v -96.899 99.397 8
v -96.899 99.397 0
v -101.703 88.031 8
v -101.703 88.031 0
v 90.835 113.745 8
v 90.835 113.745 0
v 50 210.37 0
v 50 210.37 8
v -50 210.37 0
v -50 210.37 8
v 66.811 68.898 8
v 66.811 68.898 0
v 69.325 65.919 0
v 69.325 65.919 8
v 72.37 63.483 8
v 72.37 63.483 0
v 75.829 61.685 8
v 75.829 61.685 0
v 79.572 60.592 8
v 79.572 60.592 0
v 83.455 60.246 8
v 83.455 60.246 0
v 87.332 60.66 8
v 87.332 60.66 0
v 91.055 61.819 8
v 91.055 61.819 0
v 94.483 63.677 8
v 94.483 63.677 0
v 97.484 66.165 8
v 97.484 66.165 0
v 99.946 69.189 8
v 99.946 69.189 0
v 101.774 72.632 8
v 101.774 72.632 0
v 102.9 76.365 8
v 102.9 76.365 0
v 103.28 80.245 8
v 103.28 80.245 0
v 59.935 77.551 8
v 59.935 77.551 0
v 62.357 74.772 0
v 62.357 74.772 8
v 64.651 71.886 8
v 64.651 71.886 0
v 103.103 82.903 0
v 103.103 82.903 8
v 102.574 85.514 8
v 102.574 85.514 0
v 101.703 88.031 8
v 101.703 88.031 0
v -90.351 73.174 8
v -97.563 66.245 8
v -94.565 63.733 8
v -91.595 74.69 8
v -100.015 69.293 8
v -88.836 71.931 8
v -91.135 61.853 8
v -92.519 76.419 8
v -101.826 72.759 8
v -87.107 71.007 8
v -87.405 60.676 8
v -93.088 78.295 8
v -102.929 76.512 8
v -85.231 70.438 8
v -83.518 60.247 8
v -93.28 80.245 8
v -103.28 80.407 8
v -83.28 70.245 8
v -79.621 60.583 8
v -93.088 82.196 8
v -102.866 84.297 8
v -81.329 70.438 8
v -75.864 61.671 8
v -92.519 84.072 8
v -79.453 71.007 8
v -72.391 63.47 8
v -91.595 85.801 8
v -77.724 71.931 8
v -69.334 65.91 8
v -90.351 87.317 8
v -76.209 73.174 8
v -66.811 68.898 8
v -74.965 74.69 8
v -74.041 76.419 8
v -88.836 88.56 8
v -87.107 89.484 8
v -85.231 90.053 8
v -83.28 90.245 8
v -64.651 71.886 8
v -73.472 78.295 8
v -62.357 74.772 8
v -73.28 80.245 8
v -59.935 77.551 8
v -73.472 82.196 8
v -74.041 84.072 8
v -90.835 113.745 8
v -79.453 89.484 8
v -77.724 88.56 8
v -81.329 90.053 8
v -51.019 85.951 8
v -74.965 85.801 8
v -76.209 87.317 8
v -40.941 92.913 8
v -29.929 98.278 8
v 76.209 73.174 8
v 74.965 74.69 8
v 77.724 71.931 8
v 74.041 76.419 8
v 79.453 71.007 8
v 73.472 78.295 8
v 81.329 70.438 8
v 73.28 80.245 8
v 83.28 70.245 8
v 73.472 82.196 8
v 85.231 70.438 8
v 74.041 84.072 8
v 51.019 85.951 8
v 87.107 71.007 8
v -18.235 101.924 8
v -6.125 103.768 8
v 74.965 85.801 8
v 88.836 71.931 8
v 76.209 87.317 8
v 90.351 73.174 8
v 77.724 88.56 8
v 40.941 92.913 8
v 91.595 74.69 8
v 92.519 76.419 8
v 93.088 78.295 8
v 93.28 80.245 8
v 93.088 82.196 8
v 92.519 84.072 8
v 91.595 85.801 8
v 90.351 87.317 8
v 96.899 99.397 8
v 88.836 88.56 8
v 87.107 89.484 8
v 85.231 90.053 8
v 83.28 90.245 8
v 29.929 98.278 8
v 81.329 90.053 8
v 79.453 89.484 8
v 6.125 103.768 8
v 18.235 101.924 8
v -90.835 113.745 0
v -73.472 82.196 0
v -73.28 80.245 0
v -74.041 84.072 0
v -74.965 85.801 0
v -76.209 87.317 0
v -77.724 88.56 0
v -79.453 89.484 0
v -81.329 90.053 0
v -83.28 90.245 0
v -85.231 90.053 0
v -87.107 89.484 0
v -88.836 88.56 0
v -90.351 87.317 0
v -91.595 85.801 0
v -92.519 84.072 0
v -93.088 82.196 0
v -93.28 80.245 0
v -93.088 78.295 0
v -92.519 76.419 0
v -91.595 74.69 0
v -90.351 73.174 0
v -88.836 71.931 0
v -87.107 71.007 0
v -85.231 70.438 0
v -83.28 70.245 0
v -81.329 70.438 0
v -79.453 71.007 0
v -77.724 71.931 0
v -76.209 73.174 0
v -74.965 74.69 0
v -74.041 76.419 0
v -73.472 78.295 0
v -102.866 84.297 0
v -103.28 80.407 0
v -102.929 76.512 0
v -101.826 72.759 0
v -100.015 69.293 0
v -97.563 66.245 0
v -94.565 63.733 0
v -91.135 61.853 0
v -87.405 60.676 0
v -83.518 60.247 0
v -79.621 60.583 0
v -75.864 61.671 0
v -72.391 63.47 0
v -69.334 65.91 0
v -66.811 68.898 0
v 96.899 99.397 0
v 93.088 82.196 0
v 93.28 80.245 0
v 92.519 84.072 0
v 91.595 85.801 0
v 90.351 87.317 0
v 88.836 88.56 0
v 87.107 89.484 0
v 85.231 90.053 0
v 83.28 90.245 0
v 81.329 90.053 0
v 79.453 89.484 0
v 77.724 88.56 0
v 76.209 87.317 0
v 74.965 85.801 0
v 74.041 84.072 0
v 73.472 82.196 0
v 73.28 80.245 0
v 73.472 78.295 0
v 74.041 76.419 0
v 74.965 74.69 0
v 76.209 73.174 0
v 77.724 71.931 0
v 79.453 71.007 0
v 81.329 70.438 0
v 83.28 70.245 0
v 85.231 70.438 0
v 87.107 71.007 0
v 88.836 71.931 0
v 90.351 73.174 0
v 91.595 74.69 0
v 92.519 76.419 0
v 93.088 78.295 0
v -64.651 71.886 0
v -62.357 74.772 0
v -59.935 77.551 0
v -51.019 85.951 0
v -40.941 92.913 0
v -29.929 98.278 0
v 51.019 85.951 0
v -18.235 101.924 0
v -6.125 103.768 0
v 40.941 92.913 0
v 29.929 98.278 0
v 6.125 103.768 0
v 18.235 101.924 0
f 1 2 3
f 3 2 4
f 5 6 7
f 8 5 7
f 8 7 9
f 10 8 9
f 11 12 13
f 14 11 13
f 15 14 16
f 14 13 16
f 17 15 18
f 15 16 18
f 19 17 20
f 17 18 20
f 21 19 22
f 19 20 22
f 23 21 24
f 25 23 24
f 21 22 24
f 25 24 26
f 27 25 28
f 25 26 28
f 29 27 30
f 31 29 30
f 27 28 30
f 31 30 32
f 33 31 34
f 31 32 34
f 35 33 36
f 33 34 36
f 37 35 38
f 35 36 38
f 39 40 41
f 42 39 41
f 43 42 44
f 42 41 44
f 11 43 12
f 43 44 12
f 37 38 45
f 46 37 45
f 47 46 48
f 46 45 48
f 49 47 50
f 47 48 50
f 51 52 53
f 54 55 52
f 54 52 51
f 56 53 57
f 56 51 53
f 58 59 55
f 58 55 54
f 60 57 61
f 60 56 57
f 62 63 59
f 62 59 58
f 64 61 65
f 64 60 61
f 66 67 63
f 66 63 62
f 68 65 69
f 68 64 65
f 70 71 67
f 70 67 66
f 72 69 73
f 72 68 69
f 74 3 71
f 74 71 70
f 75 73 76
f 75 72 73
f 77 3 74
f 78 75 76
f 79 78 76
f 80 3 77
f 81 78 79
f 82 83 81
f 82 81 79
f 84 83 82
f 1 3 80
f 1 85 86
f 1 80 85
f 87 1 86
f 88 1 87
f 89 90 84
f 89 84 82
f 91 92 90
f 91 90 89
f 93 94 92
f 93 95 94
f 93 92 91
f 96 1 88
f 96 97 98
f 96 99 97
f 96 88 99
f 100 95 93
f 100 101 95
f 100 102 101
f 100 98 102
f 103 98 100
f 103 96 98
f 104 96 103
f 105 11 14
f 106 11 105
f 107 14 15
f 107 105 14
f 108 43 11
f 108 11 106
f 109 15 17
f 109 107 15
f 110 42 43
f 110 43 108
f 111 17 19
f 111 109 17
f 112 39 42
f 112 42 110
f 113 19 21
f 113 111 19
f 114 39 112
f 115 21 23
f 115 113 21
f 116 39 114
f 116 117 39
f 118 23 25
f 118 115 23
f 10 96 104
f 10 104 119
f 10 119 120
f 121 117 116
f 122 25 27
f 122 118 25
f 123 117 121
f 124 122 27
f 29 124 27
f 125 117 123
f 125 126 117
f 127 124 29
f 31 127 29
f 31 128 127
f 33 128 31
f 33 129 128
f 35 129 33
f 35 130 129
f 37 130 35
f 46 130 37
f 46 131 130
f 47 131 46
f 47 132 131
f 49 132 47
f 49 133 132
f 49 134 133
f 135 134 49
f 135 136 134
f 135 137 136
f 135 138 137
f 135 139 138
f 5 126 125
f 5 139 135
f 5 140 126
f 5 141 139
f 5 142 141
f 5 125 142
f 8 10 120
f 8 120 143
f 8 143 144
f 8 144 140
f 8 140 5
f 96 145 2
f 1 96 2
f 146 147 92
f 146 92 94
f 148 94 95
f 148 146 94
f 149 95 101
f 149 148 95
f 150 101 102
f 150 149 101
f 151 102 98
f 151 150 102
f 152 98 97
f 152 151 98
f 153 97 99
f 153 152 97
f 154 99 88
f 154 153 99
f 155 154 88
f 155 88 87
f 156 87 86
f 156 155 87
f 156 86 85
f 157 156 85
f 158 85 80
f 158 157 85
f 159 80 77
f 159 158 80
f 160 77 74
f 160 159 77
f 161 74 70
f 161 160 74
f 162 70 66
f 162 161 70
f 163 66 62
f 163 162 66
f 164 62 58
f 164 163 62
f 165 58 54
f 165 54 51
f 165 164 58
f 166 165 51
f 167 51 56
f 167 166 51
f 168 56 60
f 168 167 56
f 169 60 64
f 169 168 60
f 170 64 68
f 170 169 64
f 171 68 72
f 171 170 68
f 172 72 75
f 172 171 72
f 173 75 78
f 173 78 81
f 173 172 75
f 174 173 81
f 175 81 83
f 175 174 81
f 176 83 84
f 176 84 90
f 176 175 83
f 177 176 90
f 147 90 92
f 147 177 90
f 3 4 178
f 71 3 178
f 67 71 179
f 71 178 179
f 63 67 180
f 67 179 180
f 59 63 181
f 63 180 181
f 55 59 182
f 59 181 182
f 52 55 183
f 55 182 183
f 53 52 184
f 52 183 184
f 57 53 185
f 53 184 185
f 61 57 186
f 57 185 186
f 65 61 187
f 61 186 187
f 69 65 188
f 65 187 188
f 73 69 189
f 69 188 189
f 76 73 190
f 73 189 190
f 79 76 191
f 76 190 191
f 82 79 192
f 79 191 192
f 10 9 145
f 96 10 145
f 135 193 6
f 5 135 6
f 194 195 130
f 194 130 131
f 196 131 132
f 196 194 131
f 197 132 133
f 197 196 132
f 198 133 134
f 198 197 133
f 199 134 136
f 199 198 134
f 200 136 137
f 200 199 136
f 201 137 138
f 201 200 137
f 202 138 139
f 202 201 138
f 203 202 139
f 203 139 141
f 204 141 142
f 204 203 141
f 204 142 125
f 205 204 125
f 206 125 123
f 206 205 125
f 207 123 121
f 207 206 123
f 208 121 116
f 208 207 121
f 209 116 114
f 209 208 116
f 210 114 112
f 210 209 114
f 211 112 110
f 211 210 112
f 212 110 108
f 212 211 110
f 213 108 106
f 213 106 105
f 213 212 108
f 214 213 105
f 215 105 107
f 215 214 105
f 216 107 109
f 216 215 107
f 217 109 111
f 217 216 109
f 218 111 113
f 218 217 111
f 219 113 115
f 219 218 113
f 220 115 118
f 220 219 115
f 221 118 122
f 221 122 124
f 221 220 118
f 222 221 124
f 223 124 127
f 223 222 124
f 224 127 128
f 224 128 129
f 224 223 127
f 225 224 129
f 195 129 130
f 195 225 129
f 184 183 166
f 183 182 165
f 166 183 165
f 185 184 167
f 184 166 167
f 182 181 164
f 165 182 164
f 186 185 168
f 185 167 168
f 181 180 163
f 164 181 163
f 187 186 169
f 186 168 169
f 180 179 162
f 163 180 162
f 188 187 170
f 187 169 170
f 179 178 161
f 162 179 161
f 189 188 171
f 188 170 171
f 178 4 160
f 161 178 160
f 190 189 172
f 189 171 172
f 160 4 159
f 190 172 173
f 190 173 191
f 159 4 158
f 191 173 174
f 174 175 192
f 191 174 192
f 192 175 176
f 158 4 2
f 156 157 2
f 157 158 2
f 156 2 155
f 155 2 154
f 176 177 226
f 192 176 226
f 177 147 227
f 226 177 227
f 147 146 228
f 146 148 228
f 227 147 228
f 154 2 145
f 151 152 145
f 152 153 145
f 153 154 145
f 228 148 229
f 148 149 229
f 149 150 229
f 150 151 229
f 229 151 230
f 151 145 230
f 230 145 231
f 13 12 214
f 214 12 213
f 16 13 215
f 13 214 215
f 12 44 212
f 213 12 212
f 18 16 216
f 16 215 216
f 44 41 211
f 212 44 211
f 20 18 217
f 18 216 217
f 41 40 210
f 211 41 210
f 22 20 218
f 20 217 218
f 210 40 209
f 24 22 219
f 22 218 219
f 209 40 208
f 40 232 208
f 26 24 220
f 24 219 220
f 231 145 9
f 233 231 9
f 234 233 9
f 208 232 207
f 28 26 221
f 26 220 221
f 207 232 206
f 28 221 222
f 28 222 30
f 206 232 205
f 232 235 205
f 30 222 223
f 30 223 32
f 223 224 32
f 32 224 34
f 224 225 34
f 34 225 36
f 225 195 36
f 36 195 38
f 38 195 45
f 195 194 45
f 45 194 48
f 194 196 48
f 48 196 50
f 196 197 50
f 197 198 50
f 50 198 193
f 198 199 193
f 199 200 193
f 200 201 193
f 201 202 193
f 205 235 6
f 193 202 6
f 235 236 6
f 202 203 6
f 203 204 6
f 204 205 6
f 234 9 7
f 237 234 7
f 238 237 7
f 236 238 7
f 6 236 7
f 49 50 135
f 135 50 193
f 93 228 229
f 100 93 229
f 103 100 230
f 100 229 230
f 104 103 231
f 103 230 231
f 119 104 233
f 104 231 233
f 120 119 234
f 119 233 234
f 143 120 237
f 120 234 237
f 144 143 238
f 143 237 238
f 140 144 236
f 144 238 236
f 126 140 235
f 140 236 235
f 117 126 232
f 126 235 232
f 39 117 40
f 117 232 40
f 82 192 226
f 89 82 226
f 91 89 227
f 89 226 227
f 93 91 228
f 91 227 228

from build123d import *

# Parameters (mm, degrees)
F0_R     = 10
F1_DEPTH = 8


with BuildPart() as f1:
    # F0 (on Top) → F1 (new body)
    with BuildSketch(Plane.XY):
        with BuildLine():
            ThreePointArc((66.8107155763, 68.8983527146), (89.2220086446, 61.1485010982), (103.2801650714, 80.2454771665))
            ThreePointArc((103.2801650714, 80.2454771665), (102.8817929615, 84.2174016446), (101.7025466654, 88.0310957293))
            ThreePointArc((101.7025466654, 88.0310957293), (73.6640874011, 97.7820404055), (66.8107155763, 68.8983527146))
        make_face()
        with Locations((83.2801650714, 80.2454771665)):
            Circle(F0_R, mode=Mode.SUBTRACT)
        with BuildLine():
            ThreePointArc((66.8107155763, 68.8983527146), (73.6640874011, 97.7820404055), (101.7025466654, 88.0310957293))
            Line((101.7025466654, 88.0310957293), (96.8992238213, 99.3967496769))
            ThreePointArc((96.8992238213, 99.3967496769), (71.3236564608, 100.476441104), (59.9351524158, 77.550967172))
            ThreePointArc((59.9351524158, 77.550967172), (63.5204352748, 73.3418677958), (66.8107155763, 68.8983527146))
        make_face()
        with BuildLine():
            ThreePointArc((59.9351524158, 77.550967172), (71.3236564608, 100.476441104), (96.8992238213, 99.3967496769))
            Line((96.8992238213, 99.3967496769), (90.8352022654, 113.7454771665))
            Line((90.8352022654, 113.7454771665), (-90.8352022654, 113.7454771665))
            Line((-90.8352022654, 113.7454771665), (-96.8992238213, 99.3967496769))
            ThreePointArc((-96.8992238213, 99.3967496769), (-72.5051449003, 101.1296563534), (-59.7801650714, 80.2454771665))
            ThreePointArc((-59.7801650714, 80.2454771665), (-59.8189439032, 78.8959953041), (-59.9351524158, 77.550967172))
            ThreePointArc((-59.9351524158, 77.550967172), (0, 104), (59.9351524158, 77.550967172))
        make_face()
        with BuildLine():
            ThreePointArc((-66.8107155763, 68.8983527146), (-63.5204352748, 73.3418677958), (-59.9351524158, 77.550967172))
            ThreePointArc((-59.9351524158, 77.550967172), (-59.8189439032, 78.8959953041), (-59.7801650714, 80.2454771665))
            ThreePointArc((-59.7801650714, 80.2454771665), (-72.5051449003, 101.1296563534), (-96.8992238213, 99.3967496769))
            Line((-96.8992238213, 99.3967496769), (-101.7025466654, 88.0310957293))
            ThreePointArc((-101.7025466654, 88.0310957293), (-79.3082405933, 99.8471050565), (-63.2801650714, 80.2454771665))
            ThreePointArc((-63.2801650714, 80.2454771665), (-64.1831890032, 74.3036335933), (-66.8107155763, 68.8983527146))
        make_face()
        with BuildLine():
            ThreePointArc((-101.7025466654, 88.0310957293), (-92.8962427418, 62.7089139274), (-66.8107155763, 68.8983527146))
            ThreePointArc((-66.8107155763, 68.8983527146), (-64.1831890032, 74.3036335933), (-63.2801650714, 80.2454771665))
            ThreePointArc((-63.2801650714, 80.2454771665), (-79.3082405933, 99.8471050565), (-101.7025466654, 88.0310957293))
        make_face()
        with Locations((-83.2801650714, 80.2454771665)):
            Circle(F0_R, mode=Mode.SUBTRACT)
        Polygon((-90.8352022654, 113.7454771665), (90.8352022654, 113.7454771665), (50, 210.37), (0, 210.37), (-50, 210.37), align=None)
    extrude(amount=F1_DEPTH)


solid = f1.part
